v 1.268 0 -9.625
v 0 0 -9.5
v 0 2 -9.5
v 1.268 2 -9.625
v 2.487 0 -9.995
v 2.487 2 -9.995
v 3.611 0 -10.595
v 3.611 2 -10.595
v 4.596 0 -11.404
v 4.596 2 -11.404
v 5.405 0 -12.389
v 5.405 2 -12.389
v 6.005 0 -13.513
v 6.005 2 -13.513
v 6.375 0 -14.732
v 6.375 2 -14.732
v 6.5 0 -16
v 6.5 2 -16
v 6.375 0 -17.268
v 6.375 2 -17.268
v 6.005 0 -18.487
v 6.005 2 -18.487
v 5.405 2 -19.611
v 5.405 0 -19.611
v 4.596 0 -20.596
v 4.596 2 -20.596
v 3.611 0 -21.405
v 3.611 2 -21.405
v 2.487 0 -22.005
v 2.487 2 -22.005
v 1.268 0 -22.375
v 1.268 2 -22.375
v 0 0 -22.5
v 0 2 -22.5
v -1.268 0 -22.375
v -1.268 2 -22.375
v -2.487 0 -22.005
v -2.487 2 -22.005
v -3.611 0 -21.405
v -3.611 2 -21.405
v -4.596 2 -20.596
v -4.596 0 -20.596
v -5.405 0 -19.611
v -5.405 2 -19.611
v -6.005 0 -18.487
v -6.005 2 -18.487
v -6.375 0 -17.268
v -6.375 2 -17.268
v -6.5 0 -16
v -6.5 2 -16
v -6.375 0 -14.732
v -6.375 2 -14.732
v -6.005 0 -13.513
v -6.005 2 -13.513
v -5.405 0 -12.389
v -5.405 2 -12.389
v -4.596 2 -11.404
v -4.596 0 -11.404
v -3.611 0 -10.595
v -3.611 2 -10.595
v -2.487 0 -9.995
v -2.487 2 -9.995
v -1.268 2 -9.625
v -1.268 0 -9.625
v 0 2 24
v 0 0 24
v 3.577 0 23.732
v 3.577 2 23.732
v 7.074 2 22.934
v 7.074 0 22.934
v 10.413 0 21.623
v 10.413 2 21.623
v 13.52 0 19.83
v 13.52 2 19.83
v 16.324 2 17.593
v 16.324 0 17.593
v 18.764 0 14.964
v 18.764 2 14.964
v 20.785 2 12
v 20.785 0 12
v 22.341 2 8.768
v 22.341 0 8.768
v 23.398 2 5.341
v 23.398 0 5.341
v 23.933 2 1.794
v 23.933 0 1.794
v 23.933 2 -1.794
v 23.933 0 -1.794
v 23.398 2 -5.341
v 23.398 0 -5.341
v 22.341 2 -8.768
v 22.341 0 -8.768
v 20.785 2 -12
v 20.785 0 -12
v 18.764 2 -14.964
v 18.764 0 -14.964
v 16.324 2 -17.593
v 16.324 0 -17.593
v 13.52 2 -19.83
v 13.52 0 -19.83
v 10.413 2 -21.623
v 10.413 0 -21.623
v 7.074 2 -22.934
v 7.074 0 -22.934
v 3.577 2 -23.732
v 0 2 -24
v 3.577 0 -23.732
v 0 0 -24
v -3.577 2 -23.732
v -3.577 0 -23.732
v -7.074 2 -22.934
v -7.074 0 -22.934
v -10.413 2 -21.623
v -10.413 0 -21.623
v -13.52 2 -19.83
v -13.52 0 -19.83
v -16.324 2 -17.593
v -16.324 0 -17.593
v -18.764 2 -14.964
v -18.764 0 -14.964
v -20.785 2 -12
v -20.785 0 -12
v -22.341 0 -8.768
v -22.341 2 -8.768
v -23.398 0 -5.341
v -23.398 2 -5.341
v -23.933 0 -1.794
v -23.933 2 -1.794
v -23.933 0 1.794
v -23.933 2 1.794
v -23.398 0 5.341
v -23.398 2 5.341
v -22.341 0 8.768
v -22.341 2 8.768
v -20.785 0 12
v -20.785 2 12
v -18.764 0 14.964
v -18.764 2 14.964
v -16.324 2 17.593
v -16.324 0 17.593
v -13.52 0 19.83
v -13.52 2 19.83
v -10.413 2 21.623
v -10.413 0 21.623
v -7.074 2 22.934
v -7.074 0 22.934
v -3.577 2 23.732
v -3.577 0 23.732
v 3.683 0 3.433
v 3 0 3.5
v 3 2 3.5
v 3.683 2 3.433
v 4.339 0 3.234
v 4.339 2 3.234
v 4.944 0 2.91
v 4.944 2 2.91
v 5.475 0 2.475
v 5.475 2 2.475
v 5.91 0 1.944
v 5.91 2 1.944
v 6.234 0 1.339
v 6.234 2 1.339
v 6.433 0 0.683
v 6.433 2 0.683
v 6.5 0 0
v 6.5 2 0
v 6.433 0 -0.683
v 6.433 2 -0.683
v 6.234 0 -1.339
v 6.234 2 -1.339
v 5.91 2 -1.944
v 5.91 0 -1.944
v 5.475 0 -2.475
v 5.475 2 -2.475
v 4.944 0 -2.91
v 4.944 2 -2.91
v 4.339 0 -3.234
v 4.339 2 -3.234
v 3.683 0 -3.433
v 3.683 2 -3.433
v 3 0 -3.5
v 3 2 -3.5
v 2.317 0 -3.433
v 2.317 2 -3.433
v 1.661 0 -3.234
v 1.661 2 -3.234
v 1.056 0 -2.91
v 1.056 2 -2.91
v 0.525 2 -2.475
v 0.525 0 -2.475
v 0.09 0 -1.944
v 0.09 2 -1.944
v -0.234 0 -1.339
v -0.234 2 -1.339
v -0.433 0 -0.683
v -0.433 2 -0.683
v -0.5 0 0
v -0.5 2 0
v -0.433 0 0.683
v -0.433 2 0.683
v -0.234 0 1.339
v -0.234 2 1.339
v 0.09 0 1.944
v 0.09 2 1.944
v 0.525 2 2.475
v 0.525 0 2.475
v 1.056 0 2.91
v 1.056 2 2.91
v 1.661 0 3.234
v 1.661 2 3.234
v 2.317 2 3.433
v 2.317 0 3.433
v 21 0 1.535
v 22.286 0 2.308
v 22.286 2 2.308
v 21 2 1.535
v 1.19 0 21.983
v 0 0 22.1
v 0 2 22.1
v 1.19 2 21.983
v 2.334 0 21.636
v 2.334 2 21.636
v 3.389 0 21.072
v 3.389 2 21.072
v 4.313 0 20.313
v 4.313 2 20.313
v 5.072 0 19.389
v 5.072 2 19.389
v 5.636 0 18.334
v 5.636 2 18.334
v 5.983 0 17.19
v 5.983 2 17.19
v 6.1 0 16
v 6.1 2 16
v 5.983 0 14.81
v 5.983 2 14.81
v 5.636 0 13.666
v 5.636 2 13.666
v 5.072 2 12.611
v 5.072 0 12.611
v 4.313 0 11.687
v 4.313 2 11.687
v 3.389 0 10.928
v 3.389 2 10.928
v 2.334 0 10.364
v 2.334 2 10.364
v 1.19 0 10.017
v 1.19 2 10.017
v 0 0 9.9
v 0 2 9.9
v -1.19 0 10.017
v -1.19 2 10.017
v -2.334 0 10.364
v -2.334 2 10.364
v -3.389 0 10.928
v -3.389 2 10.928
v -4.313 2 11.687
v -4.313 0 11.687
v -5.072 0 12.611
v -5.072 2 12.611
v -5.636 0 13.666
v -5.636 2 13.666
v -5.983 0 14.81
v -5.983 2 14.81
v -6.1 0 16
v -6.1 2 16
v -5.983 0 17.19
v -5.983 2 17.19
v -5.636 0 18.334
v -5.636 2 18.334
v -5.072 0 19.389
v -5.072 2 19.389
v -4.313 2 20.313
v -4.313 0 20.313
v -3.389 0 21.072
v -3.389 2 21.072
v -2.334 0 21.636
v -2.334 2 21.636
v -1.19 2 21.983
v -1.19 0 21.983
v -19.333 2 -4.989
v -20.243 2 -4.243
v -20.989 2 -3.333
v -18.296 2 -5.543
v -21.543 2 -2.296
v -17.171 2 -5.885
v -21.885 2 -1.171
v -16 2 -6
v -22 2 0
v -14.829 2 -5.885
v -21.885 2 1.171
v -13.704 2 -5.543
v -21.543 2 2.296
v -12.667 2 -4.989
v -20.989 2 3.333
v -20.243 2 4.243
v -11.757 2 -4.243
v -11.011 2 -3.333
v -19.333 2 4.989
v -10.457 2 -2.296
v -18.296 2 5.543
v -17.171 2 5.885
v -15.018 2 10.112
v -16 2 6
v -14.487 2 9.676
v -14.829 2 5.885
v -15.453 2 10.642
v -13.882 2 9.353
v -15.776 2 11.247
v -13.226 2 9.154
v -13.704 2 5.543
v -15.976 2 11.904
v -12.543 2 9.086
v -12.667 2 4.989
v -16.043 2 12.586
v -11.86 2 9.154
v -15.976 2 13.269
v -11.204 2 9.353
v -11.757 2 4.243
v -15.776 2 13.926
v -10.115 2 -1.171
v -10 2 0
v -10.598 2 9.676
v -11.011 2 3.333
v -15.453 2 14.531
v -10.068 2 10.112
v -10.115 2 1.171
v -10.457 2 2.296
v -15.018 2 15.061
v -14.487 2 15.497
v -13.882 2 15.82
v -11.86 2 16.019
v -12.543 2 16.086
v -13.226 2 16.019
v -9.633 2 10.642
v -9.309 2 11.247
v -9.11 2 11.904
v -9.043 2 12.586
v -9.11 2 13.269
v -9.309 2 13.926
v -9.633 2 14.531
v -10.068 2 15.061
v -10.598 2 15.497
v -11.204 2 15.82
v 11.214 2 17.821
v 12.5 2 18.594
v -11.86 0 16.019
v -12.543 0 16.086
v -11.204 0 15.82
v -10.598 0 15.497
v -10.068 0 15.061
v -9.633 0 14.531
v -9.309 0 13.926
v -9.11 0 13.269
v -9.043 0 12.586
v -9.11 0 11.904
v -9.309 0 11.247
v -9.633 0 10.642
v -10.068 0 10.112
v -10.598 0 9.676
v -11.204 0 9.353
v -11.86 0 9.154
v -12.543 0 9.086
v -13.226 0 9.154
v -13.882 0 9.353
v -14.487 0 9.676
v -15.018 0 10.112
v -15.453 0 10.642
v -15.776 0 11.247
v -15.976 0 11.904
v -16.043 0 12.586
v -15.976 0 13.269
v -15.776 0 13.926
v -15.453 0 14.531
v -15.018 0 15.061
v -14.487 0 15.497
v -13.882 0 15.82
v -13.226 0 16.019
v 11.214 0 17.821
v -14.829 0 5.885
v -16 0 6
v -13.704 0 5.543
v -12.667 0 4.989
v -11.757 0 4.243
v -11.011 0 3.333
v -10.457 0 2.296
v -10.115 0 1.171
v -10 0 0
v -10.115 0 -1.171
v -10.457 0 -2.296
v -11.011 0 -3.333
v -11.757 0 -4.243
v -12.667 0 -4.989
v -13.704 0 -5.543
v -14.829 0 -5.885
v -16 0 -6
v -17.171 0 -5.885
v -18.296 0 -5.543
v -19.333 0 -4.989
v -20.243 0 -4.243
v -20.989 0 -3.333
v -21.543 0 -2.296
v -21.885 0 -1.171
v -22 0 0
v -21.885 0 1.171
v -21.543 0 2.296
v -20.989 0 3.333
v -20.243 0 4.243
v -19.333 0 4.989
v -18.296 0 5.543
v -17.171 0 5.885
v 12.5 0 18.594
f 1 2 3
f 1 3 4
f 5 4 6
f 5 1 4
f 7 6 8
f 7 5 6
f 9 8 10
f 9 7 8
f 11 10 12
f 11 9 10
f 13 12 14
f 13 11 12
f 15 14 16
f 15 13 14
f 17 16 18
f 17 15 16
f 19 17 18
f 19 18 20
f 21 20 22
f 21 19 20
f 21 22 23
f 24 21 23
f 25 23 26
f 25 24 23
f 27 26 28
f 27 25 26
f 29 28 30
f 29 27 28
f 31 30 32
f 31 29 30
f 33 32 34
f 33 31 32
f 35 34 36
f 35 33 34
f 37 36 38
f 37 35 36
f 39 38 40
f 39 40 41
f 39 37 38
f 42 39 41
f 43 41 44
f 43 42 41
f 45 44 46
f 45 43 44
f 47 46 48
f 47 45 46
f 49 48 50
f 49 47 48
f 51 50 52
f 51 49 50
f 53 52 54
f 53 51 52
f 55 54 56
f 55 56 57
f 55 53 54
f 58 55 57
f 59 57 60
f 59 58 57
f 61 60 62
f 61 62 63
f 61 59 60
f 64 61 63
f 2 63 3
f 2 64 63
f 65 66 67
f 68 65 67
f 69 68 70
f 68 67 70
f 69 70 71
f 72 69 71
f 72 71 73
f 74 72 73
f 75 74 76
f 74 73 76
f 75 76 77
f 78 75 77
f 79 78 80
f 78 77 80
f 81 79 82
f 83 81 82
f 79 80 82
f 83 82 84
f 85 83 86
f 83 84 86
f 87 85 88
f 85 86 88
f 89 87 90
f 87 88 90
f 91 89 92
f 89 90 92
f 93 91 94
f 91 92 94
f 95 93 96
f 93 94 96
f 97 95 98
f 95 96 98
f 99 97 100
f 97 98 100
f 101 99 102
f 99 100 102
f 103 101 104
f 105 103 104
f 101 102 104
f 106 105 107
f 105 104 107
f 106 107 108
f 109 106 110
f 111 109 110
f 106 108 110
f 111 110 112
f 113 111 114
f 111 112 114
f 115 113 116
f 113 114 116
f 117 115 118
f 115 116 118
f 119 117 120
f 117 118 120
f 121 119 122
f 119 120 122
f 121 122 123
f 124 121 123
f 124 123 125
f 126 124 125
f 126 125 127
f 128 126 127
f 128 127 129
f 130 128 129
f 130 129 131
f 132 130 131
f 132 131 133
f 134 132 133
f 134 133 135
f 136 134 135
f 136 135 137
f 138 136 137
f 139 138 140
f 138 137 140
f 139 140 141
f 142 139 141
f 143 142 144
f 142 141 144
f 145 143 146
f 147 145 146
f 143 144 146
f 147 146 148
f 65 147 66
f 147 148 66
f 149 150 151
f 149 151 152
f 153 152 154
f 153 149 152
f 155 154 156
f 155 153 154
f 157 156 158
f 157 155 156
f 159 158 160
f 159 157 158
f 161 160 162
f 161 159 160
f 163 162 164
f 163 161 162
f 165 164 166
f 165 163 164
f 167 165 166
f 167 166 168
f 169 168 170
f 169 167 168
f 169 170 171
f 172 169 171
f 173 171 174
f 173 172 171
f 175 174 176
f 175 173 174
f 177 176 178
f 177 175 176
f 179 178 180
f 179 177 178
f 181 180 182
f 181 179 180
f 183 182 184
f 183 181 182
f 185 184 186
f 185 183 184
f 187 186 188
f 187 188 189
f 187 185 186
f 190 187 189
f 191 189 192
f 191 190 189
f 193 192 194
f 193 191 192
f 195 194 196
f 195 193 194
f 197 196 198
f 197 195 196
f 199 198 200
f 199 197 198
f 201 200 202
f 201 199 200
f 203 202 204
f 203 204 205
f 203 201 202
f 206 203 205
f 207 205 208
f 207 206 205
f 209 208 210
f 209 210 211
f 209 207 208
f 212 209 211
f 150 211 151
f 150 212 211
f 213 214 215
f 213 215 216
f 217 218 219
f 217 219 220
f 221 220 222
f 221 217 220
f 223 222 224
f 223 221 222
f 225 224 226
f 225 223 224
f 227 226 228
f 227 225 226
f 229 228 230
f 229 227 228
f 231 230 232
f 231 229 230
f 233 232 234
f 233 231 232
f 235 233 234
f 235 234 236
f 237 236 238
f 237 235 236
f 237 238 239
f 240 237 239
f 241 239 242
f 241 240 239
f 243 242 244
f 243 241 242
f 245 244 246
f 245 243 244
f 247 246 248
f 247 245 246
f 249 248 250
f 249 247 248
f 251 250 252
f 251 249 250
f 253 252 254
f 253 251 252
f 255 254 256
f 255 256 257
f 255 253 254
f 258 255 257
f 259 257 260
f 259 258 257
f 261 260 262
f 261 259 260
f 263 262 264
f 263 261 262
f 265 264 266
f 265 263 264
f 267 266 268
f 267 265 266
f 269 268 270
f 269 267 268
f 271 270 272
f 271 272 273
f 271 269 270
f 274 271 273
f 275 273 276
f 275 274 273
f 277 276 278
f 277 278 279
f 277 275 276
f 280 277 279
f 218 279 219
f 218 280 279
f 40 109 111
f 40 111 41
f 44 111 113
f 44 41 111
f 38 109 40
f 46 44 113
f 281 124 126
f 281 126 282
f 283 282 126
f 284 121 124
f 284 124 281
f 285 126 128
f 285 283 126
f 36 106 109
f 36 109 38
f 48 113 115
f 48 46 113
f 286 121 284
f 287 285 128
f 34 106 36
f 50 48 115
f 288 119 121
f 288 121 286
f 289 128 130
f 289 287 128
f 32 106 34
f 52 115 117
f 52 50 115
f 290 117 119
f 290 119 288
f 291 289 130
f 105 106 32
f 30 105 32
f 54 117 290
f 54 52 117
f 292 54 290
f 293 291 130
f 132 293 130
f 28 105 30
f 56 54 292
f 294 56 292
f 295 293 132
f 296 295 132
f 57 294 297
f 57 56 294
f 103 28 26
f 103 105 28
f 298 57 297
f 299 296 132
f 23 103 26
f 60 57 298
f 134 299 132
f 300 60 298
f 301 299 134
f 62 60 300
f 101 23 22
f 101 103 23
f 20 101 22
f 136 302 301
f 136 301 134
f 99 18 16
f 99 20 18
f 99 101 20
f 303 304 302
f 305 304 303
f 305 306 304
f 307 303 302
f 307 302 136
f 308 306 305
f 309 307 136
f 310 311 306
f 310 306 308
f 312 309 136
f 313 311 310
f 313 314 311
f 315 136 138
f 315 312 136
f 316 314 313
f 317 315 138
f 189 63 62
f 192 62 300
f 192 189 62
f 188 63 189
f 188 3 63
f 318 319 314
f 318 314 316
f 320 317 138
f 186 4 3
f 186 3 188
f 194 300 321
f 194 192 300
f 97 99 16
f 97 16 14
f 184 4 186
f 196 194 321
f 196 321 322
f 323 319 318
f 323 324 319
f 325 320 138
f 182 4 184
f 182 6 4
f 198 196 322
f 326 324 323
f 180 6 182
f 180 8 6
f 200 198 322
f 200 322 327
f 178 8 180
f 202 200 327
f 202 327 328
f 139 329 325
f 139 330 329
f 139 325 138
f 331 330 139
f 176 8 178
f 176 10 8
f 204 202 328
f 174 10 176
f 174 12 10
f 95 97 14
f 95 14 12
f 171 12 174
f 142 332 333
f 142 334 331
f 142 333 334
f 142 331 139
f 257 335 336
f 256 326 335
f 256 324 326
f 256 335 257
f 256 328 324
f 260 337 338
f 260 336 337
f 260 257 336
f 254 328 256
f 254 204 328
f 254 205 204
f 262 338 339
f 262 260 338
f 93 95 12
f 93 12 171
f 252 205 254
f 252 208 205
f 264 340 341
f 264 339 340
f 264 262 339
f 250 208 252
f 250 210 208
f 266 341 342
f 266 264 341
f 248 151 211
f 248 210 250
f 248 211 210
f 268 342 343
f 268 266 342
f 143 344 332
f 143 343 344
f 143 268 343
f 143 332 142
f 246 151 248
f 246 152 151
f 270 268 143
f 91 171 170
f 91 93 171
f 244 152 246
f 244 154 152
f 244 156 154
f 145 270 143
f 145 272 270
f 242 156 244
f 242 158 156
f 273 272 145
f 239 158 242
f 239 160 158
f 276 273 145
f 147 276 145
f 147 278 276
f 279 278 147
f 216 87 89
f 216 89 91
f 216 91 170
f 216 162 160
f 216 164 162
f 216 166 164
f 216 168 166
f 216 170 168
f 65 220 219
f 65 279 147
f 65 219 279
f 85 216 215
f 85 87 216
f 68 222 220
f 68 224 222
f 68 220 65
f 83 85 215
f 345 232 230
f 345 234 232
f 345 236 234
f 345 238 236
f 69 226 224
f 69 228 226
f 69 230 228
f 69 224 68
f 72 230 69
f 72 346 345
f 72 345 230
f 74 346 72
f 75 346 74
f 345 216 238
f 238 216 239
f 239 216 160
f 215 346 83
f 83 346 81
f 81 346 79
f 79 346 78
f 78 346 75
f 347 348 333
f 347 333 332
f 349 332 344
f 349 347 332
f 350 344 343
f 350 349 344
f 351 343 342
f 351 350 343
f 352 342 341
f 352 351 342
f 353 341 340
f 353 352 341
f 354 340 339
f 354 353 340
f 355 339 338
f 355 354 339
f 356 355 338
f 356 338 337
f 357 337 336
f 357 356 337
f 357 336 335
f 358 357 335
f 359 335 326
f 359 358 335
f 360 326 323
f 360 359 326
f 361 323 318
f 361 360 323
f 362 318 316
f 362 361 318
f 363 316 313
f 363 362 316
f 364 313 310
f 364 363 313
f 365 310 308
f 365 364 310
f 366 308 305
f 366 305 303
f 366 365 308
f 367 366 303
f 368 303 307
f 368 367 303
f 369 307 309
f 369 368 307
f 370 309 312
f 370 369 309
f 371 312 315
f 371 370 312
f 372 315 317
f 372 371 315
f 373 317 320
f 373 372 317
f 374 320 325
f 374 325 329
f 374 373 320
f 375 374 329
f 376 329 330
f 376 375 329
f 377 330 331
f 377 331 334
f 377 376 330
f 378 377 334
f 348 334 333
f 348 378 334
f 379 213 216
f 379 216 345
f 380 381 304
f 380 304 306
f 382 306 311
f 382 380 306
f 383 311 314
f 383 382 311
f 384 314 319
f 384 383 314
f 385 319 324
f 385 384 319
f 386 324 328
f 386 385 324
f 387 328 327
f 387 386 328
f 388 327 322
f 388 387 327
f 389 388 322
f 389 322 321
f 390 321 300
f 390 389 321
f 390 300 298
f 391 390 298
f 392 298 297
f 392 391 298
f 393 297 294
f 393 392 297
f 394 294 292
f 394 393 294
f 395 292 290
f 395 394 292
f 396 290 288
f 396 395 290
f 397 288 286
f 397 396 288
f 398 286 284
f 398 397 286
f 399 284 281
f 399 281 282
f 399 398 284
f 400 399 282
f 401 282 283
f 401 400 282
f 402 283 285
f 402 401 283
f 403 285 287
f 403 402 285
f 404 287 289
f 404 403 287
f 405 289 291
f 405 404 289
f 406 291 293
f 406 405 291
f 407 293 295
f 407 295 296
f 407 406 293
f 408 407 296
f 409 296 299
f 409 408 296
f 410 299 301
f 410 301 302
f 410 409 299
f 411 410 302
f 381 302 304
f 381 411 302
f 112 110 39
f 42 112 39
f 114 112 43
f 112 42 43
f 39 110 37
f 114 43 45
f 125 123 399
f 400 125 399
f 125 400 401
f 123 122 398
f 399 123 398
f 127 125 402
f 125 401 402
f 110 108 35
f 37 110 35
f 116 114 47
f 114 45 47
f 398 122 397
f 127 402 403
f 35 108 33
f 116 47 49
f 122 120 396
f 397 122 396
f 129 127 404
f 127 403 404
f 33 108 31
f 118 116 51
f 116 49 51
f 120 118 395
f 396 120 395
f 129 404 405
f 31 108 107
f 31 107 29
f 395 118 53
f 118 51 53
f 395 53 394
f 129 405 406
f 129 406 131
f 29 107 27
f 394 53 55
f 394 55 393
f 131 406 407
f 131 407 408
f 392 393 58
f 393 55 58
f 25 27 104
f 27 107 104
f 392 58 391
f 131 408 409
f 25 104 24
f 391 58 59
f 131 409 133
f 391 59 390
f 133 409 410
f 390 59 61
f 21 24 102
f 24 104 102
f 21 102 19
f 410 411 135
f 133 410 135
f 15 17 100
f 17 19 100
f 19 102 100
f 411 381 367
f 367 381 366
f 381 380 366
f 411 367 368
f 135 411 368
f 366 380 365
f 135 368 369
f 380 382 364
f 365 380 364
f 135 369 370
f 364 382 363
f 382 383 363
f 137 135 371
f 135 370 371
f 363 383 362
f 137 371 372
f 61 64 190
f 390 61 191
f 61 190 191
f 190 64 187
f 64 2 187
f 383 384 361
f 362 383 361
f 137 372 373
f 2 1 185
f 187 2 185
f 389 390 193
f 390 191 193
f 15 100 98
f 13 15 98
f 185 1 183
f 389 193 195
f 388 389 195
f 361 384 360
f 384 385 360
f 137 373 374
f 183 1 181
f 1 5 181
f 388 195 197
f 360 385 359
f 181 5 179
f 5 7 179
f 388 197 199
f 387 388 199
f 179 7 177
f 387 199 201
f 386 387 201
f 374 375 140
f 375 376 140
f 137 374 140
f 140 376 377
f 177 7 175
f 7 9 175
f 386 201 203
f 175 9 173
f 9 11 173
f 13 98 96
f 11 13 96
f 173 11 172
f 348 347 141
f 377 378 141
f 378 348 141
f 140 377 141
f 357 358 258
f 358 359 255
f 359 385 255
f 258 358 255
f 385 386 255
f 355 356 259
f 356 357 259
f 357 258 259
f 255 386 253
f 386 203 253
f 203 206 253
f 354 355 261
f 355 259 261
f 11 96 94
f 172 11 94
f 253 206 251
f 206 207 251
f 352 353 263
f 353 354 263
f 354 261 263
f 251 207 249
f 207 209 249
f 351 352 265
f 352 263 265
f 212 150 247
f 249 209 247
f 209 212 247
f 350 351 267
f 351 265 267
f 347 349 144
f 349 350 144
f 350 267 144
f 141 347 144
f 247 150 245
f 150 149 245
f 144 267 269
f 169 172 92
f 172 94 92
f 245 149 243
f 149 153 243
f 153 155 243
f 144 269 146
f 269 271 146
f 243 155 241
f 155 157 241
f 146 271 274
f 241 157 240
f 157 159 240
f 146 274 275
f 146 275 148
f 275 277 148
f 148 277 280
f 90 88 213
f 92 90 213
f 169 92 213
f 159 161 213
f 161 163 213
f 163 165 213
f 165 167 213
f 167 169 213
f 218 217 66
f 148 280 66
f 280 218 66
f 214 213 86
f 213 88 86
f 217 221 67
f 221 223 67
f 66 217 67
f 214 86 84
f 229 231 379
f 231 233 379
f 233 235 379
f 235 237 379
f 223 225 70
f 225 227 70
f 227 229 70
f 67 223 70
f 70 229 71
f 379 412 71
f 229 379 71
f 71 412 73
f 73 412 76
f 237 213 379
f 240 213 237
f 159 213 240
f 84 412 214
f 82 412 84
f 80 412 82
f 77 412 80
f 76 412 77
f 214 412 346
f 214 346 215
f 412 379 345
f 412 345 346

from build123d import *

# Parameters (mm, degrees)
ESQUISSE1_R        = 24
ESQUISSE1_R_2      = 6.5
ESQUISSE1_R_3      = 6
ESQUISSE1_R_4      = 6.1
ESQUISSE1_R_5      = 3.5
BOSS_EXTRU_1_DEPTH = 2


with BuildPart() as part:
    # Esquisse1 → Boss.-Extru.1 (new body)
    with BuildSketch(Plane(origin=(0, 0, 0), x_dir=(1, 0, 0), z_dir=(0, 1, 0))):
        with Locations(Location((0, 0, 0), (0, 0, 270))):
            Circle(ESQUISSE1_R)
        with Locations(Location((0, 16, 0), (0, 0, 270))):
            Circle(ESQUISSE1_R_2, mode=Mode.SUBTRACT)
        with Locations(Location((-16, 0, 0), (0, 0, 270))):
            Circle(ESQUISSE1_R_3, mode=Mode.SUBTRACT)
        with Locations(Location((0, -16, 0), (0, 0, 270))):
            Circle(ESQUISSE1_R_4, mode=Mode.SUBTRACT)
        with Locations(Location((-12.542919229, -12.586407821, 0), (0, 0, 270))):
            Circle(ESQUISSE1_R_5, mode=Mode.SUBTRACT)
        with Locations(Location((3, 0, 0), (0, 0, 270))):
            Circle(ESQUISSE1_R_5, mode=Mode.SUBTRACT)
        Polygon((21, -1.535055726), (11.214276577, -17.821234439), (12.500027528, -18.593791552), (22.285750951, -2.307612838), align=None, mode=Mode.SUBTRACT)
    extrude(amount=BOSS_EXTRU_1_DEPTH)


solid = part.part
